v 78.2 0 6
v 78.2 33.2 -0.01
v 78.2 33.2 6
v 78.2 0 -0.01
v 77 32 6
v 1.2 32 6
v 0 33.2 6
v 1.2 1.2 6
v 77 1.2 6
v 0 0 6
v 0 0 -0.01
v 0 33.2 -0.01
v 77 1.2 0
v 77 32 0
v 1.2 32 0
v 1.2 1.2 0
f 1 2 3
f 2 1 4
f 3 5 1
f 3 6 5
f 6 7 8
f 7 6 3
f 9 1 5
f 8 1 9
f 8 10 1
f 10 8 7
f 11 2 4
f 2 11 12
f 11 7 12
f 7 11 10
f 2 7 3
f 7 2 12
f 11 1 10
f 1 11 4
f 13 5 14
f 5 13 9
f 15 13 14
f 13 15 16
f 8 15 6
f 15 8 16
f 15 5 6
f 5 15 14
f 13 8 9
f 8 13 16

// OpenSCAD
// file: ../Base/Rotation.scad
// Fischertechnik Box Foundation
// Geometry Helpers Rotation

include <PlacementOptions.scad>

// getRotatedSpace(space, rotation=NoRotation)
// Rotates the space dependent on the specified rotation

function getRotatedSpace(space, rotation=NoRotation) = [
    (rotation == Rotate90 || rotation == Rotate270) ? space.y : space.x,
    (rotation == Rotate90 || rotation == Rotate270) ? space.x : space.y
];

// Rotates the given space around the fixed left lower corner
// space = the space the children needs as width/depth list [width,depth]
// rotation = 0 Rotate0 degrees, 1 Rotate90 degrees, 2 Rotate180 degrees, 3 Rotate270 degrees (equivalent to -90)

module RotateFix(space, rotation=NoRotation) {
    dy = (rotation == Rotate0 || rotation == Rotate270) ? 0 :
        (rotation == Rotate90) ? space.x :
        space.y;
    dx = (rotation < Rotate180) ? 0 :
        (rotation == Rotate180) ? space.x :
        space.y;
    
    translate([dx, dy, 0])
        rotate([0, 0, rotations[rotation]])
            children();
}
// file: ../Base/Alignment.scad
// Fischertechnik Box Foundation
// Geometry Helpers Alignment

include <PlacementOptions.scad>

// getAlignedX(elementWidth, spaceWidth, align=AlignRight, offset=0)
// Gets the aligned X offset of an element with the given
// width in the given space.
// elementWidth = The width of the element to positon
// spaceWidth = The space where the element should be aligned
// align = 0 AlignLeft, 1 AlignCenter, 2 AlignRight
// offset = an optional offset from the aligned position. When
// aligned left or centered, then positive values are in X direction.
// When aligned right then positive values are in negative X direction.

function getAlignedX(elementWidth, spaceWidth, align=AlignRight, offset=0) =
    (align == AlignLeft) ?
        offset :
        ((align == AlignCenter) ?
        (spaceWidth - elementWidth)/2 + offset :
        spaceWidth - offset - elementWidth);

// getAlignedY(elementDepth, spaceDepth, align=AlignTop, offset=0)
// Gets the aligned Y offset of an element with the given
// depth in the given space.
// elementDepth = The depth of the element to positon
// spaceDepth = The space where the element should be aligned
// align = 0 AlignBottom, 1 AlignCenter, 2 AlignTop
// offset = an optional offset from the aligned position. When
// aligned bottom or centered, then positive values are in Y direction.
// When aligned top then positive values are in negative Y direction.

function getAlignedY(elementDepth, spaceDepth, align=AlignTop, offset=0) =
    (align == AlignBottom) ?
        offset :
        ((align == AlignCenter) ?
        (spaceDepth - elementDepth)/2 + offset :
        spaceDepth - offset - elementDepth);
// file: ../Base/PlacementOptions.scad
// Fischertechnik Box Foundation
// Placement Options

// Alignment
NoAlign = 0;
AlignLeft = 1;
AlignBottom = 2;
AlignCenter = 3;
AlignRight = 4;
AlignTop = 5;

// Element rotation degree steps
rotations = [0, -90, -180, -270];

// Rotation
NoRotation = 0;
Rotate0 = 0;
Rotate90 = 1;
Rotate180 = 2;
Rotate270 = 3;

// Docking (seen from above)
NoDock = -1;
DockLeft = 0;
DockTop = 1;
DockRight = 2;
DockCorner = 2;
DockBottom = 3;

// Web corners
LowerLeft = 0;
UpperLeft = 1;
UpperRight = 2;
LowerRight = 3;

// Web position relative to corner
LeftOfCorner = 0;
RightOfCorner = 1;

// Rails direction
Horizontal = true;
Vertical = false;
// file: ../Base/Boxes.scad
// Fischertechnik Box Foundation
// Pre-designed Boxes

use <Constants.scad>

include <PlacementOptions.scad>

box190Width = 190;
box190Depth = 130;
box130Width = 130;
box130Depth = 95;

// Values are from an original ec3 box
topBottomDifference = 1.5;
outerHeight = 40;
baseThickness = 1.8;
innerHeight = outerHeight - baseThickness;
stackExcess = 5.7;
radius = 3.5;
wallThickness = 1.5;
tolerance = 0.2;

boxWallThickness = wallThickness;
boxBaseThickness = baseThickness;
boxWebWidth = 3.0;

// getBoxWallThickness()
// Gets the wall thickness of a Fischertechnik Box
function getBoxWallThickness() = boxWallThickness;

// getBoxUsageHeight(height = 38.2)
// Gets the usable height of a Fischertechnik box
// height = Outer height of the box from the bottom to the upper edge.
function getBoxUsageHeight(height = outerHeight) = height - baseThickness - stackExcess;

// getBoxInnerHeight()
// Gets the inner height of a Fischertechnik box, including the stack excess
function getBoxInnerHeight() = innerHeight;

// getBoxBaseThickness()
// Gets the thickness of the Fischertechnik box base.
function getBoxBaseThickness() = boxBaseThickness;

// getBoxWebWidth()
// Gets the width of a box web
function getBoxWebWidth() = boxWebWidth;

// getBox190Space()
// Gets the usable inner space of a Box 190 as an x/y-list
function getBox190Space() = [
    box190Width - 2*getBoxWallThickness() - topBottomDifference, 
    box190Depth - 2*getBoxWallThickness() - topBottomDifference ];

// RoundedCornerPlate(width, depth, height, radius)
// Creates a body plate with rounded corners for a box. Used
// also to create the complete box with the hull module.
// width = Width of the plate
// depth = depth of the plate 
// height = thickness of the plate
// radius = radius of the rounded corner
module RoundedCornerPlate(width, depth, height, radius) {
    translate([radius, radius])
    hull() {
        w = width-2*radius;
        d = depth-2*radius;
        cube([w, d, height]);
        cylinder(height, r=radius, $fn=getFragments());
        translate([w, 0])
            cylinder(height, r=radius, $fn=getFragments());
        translate([w, d])
            cylinder(height, r=radius, $fn=getFragments());
        translate([0, d])
            cylinder(height, r=radius, $fn=getFragments());
    }
}

// BoxBase(width, depth)
// Creates an empty stackable Fischertechnik compatible box
// width = Outer width of the box (190, 130, ...)
// depth = Outer depth of the box (130, 95, ...)

module BoxBase(width, depth, height=outerHeight) {    
    thinPlate = 0.01;

    innerHeight = height - baseThickness;    
    
    module Body(tolerance=tolerance) {
        hull() {
            // Bottom with tolerance to fit into the original boxes when stacked
            translate([-wallThickness+tolerance, -wallThickness+tolerance, -baseThickness])
                RoundedCornerPlate(width-topBottomDifference-2*tolerance, depth-topBottomDifference-2*tolerance, thinPlate, radius);
            
            // Top
            translate([-wallThickness-topBottomDifference/2, -wallThickness-topBottomDifference/2, innerHeight-thinPlate])
                RoundedCornerPlate(width, depth, thinPlate, radius);
         }
    }

    module Cutoff() {
        hull() {
            coWidth = width - 2*wallThickness;
            coDepth = depth - 2*wallThickness;
            
            // Bottom
            RoundedCornerPlate(coWidth-topBottomDifference, coDepth-topBottomDifference, thinPlate, radius);

            // Top
            translate([-topBottomDifference/2, -topBottomDifference/2, innerHeight+thinPlate]) 
                RoundedCornerPlate(coWidth, coDepth, thinPlate, radius);
        }
    }
    
    difference() {        
        Body();
        Cutoff();
        stackOffset = innerHeight - stackExcess;
        translate([0, 0, stackOffset + baseThickness])
            Body(tolerance=0);
    }
}

// Creates the Fischertechnik empty box 130x190 mm and places it at position 0,0
// 190x130 are the outer sizes, the inner space is slightly smaller. Use getBox190Space() to get the inner sizes.
// The box is positioned that the usable inner space is at the 0,0,0 position.

module Box190() {
    BoxBase(box190Width, box190Depth);
}

// Gets the usable inner space of a Box 130 as an x/y-list
function getBox130Space() = [
    box130Width - 2*getBoxWallThickness() - topBottomDifference, 
    box130Depth - 2*getBoxWallThickness() - topBottomDifference ];

// Creates the Fischertechnik empty box 95x130 mm and places it at position 0,0
// 190x130 are the outer sizes, the inner space is slightly smaller. Use getBox190Space() to get the inner sizes.
// The box is positioned that the usable inner space is at the 0,0,0 position.

module Box130() {
    BoxBase(box130Width, box130Depth);
}

// Creates a web at the specified box walls
// corner 0 = LowerLeft, 1 = UpperLeft, 2 = UpperRight, 3 = LowerRight
// side 0 = LeftOfCorner, 1 = RightOfCorner
// distance = Distance in mm from the corner
// boxSpace = inner width and depth of the box (default: Box 190)
// webWidth = length of the web (default is 3 mms)
// webThickness = thickness of the web (default is 1 mm)
// height = Height of the web (standard is getBoxUsageHeight())
// sink = How much of the web is sunk into the wall

module BoxWeb(
    corner, 
    side, 
    distance, 
    boxSpace=getBox190Space(), 
    webWidth=getBoxWebWidth(), 
    webThickness=1.0, 
    height=getBoxUsageHeight(),
    sink = getBoxWallThickness()/2) {
    width = (corner % 2 == 0) ? 
            (side == LeftOfCorner ? webWidth : webThickness) :
            (side == LeftOfCorner ? webThickness : webWidth);

    depth = (corner % 2 == 0) ? 
            (side == RightOfCorner ? webWidth : webThickness) :
            (side == RightOfCorner ? webThickness : webWidth);
    
    xDiff = corner == LowerLeft ? 
                (side == LeftOfCorner ? -sink : distance) :
            (corner == UpperLeft ?                
                (side == LeftOfCorner ? distance : -sink) :
            (corner == UpperRight ?
                (side == LeftOfCorner ? boxSpace.x-webWidth+sink : boxSpace.x-distance-webThickness) :
                (side == LeftOfCorner ? boxSpace.x-distance-webThickness: boxSpace.x-webWidth+sink)));

    yDiff = corner == LowerLeft ? 
                (side == RightOfCorner ? -sink : distance) :
            (corner == UpperLeft ?
                (side == RightOfCorner ? boxSpace.y-distance-webThickness : boxSpace.y-webWidth+sink) :
            (corner == UpperRight ?
                (side == RightOfCorner ? boxSpace.y-webWidth+sink : boxSpace.y-distance-webThickness) :
                (side == RightOfCorner ? distance : -sink)));
    
    translate([xDiff, yDiff, -getExcess()])
        cube([width, depth, height + 2*getExcess()]);
}
// file: ../Base/Placement.scad
// Fischertechnik Box Foundation
// Geometry Helpers Placement

use <Constants.scad>
use <Alignment.scad>
use <Rotation.scad>
use <Boxes.scad>

include <PlacementOptions.scad>

// Place(x=0, y=0, elementSpace=[0,0], alignX=AlignLeft, alignY=AlignBottom, rotation=Rotate0, boxSpace=getBox190Space())
// Places the child at the specified position
// y = Y-Position. This is a relative position when an X aligment is specified.
// x = X-Position. This is a relative position when an Y aligment is specified.
// elementSpace = space of the element to be placed [x,y]
// alignX = -1=NoAlign, 0 AlignLeft, 1 AlignCenter, 3 AlignRight (elementSpace and boxSpace required!)
// alignY = -1=NoAlign, 2 AlignBottom, 1 AlignCenter, 4 AlignTop (elementSpace and boxSpace required!)
// rotation = 0 Rotate0 0 degrees, 1 Rotate90 90 degrees, 
// 2 Rotate180 180 degrees, 3 Rotate270 270 degrees (equivalent to -90)
// boxSpace = Inner space of the box where the placement occurs [x,y] - default is Box 190x130 inner space

module Place(x=0, y=0, elementSpace=[0,0], 
  alignX=AlignLeft, alignY=AlignBottom, 
  rotation=NoRotation, boxSpace=getBox190Space()) {

    module Position(x, y, space, rotation=Rotate0) {
        translate([x, y, 0])
            RotateFix(space, rotation)
                children();
    }

    space = getRotatedSpace(elementSpace, rotation);
    alignedX = getAlignedX(space.x, boxSpace.x, alignX, x);
    alignedY = getAlignedY(space.y, boxSpace.y, alignY, y);
    Position(alignedX, alignedY, elementSpace, rotation)
        children();
}

// Center(space=getBox130Space(), elementSpace=[0,0])
// space = Space where the children is centered. For cylinder use centered=true and no elementSpace.
// elementSpace = space of the element to be centered [x,y]

module Center(space=getBox190Space(), elementSpace=[0,0]) {
    Place(elementSpace=elementSpace, boxSpace=space, alignX=AlignCenter, alignY=AlignCenter)
        children();
}

// CenterHorizontal(width=0, y=0, offset=0, space=getBox130Space())
// width = Width of the element to be placed.
// y = Y position of the element
// offset = Offset from the center position (negative will be left of the center)
// space = Space where the element is placed

module CenterHorizontal(width=0, y=0, offset=0, space=getBox190Space()) {
    Place(x=offset, y=y, elementSpace=[width, 0], boxSpace=space, alignX=AlignCenter)
        children(0);
}

// CenterVertical(depth=0, x=0, offset=0, space=getBox130Space())
// depth = Depth of the element to be placed.
// x = X position of the element
// offset = Offset from the center position (negative will be down of the center)
// space = Space where the element is placed

module CenterVertical(depth=0, x=0, offset=0, space=getBox190Space()) {
    Place(x=x, y=offset, elementSpace=[0, depth], boxSpace=space, alignY=AlignCenter)
        children(0);
}

// getIsVertical(align)
// True if the specified alignment needs a vertical orientation for a divider (AlignRight, AlignLeft)

function getIsVertical(align) = (align == AlignRight || align == AlignLeft);

// getIsHorizontal(align)
// True if the specified alignment needs a horizontal orientation for a divider (AlignTop, AlignBottom)

function getIsHorizontal(align) = (align == AlignTop || align == AlignBottom);
// file: ../Base/Constants.scad
// Fischertechnik Box Foundation
// Constants

// Constant values necessary for multiple elements

// Base constants
dividerThickness = 1.2;
excess = 0.01;
fragments = 90;
tolerance = 0.8;

// Gets the thickness of a divider 
function getDividerThickness() = dividerThickness;

// Gets the excess that is used to merge walls into each other
function getExcess() = excess;

// Gets amount of fragments of a cylinder
function getFragments() = fragments;

// Gets the inner tolerance of a frame to each side
function getTolerance() = tolerance;


// Fischertechnik specific constants
axisDiameter = 4;
axisBottomDiameter = axisDiameter + 1;
axisTolerance = 0.2;

// Gets axis diameter of Fischertechnik axis
function getAxisDiameter() = axisDiameter;

// Gets axis diameter tolerance (subtracted for element axis)
function getAxisTolerance() = axisTolerance;

// Gets the axis diameter for standing axis
function getStandAxisDiameter() = getAxisDiameter() - getAxisTolerance();

// Gets axis bottom diameter for thicker part at the bottom
function getAxisBottomDiameter() = axisBottomDiameter;

pinHeight = 2.5;
pinTolerance = 0.2;

// gets the height of a connecting pin
function getPinHeight() = pinHeight;

// gets the connecting pin height tolerance
function getPinTolerance() = pinTolerance;

standardEdgeDistance = 2.5;
standardWebDistance = 11.5;
standardCornerLength = 15;

// gets the standard distance to the wall of the box for dockable frames with webs
function getStandardEdgeDistance() = standardEdgeDistance;

// gets the standard distance of each web to the corner of the dockable frame
function getStandardWebDistance() = standardWebDistance;

// gets the standard length of the corner walls of a dockable frame
function getStandardCornerLength() = standardCornerLength;

tubeWallFactor = 0.8;

// gets the wall thickness of a tube.
function getTubeWallThickness() = tubeWallFactor * getDividerThickness();

smallPartsFrameHeight = 20;

// gets the frame height for docked small parts boxes.
function getSmallPartsFrameHeight() = smallPartsFrameHeight;

hubRingDiameter = 19.5;
hubRingLevelDiameter = 21;

// gets the diameter of a tube matching the inner ring of a wheel
function getHubRingDiameter() = hubRingDiameter;

// gets the diameter of a hub tube with a thicker diameter
function getHubRingLevelDiameter() = hubRingLevelDiameter;
// main file
// Fischertechnik Box Library
// Frame for 9V block battery set with switch
// 135719

use <../ModelBase/Simple.scad>

/* [Hidden] */
width = 75;
depth = 30;
height = 6;
volume = [width, depth, height];

// getFrame9VBatterySetSpace(columns=1, rows=1)
// Gets the space of a frame for columns x rows small parts (7.5 or 5)

function getFrame9VBatterySetSpace() = getFrameOuterVolume(volume);

// Frame9VBatterySet()
// Frame for 9V block battery set with switch

module Frame9VBatterySet() {
    Frame(volume);
}

// Tests
color("lightgray")
Frame9VBatterySet();
